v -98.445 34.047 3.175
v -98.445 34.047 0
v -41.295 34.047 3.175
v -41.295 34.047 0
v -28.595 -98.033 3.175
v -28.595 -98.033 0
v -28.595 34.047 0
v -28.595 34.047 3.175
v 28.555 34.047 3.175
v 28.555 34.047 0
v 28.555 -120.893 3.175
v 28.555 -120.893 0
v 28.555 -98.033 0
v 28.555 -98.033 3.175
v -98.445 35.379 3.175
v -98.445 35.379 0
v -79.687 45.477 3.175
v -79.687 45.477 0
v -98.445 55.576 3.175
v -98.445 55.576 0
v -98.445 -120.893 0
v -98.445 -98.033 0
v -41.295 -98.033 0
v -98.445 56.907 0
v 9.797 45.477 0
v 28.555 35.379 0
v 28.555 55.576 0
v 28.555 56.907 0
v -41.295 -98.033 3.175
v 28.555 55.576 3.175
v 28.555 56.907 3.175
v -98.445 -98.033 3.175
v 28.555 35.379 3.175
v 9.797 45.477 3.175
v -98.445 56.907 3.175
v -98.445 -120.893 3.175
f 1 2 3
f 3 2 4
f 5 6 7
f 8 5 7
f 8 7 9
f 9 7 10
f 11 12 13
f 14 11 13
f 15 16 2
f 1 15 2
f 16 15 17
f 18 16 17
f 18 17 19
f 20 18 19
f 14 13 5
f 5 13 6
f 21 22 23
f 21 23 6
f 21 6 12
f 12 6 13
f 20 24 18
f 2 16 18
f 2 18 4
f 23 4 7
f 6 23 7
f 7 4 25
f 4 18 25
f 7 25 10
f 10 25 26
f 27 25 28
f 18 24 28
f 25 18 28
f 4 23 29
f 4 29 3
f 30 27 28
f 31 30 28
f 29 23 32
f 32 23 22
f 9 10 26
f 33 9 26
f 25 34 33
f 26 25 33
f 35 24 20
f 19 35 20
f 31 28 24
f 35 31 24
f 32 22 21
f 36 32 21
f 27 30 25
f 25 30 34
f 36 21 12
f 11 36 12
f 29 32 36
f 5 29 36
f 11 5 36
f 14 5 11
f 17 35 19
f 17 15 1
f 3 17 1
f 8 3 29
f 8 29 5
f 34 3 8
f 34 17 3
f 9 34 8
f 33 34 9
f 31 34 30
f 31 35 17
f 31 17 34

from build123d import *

# Parameters (mm, degrees)
F0_W     = 12.7
F0_H     = 132.08
F1_DEPTH = 3.175
F3_DEPTH = 25.4
F4_DEPTH = 25.4


# Not quite as in the source:
# - a feature names something its author has since deleted; it is built from what else it names


with BuildPart() as f1:
    # F0 (on Top) → F1 (new body)
    with BuildSketch(Plane.XY):
        Polygon((28.5549264625, 56.9072367892), (-98.4450735375, 56.9072367892), (-98.4450735375, 34.0472367892), (-41.2950735375, 34.0472367892), (-28.5950735375, 34.0472367892), (28.5549264625, 34.0472367892), align=None)
        with Locations((-34.9450735375, -31.9927632108)):
            Rectangle(F0_W, F0_H)
        Polygon((-41.2950735375, -98.0327632108), (-98.4450735375, -98.0327632108), (-98.4450735375, -120.8927632108), (28.5549264625, -120.8927632108), (28.5549264625, -98.0327632108), (-28.5950735375, -98.0327632108), align=None)
    extrude(amount=F1_DEPTH)

    # F2 (on face) → F3 (cut)
    with BuildSketch(Plane.XY.offset(3.175)):
        Polygon((28.5549264625, 45.4772367892), (9.7966708748, 45.4772367892), (28.5549264625, 35.3785827756), align=None)
        Polygon((-98.4450735375, 35.3785827756), (-79.6868179499, 45.4772367892), (-98.4450735375, 45.4772367892), align=None)
    extrude(amount=-F3_DEPTH, mode=Mode.SUBTRACT)

    # F2 (on face) → F4 (cut)
    with BuildSketch(Plane.XY.offset(3.175)):
        Polygon((28.5549264625, 55.5758908027), (9.7966708748, 45.4772367892), (28.5549264625, 45.4772367892), align=None)
        Polygon((-98.4450735375, 45.4772367892), (-79.6868179499, 45.4772367892), (-98.4450735375, 55.5758908027), align=None)
    extrude(amount=-F4_DEPTH, mode=Mode.SUBTRACT)


solid = f1.part
